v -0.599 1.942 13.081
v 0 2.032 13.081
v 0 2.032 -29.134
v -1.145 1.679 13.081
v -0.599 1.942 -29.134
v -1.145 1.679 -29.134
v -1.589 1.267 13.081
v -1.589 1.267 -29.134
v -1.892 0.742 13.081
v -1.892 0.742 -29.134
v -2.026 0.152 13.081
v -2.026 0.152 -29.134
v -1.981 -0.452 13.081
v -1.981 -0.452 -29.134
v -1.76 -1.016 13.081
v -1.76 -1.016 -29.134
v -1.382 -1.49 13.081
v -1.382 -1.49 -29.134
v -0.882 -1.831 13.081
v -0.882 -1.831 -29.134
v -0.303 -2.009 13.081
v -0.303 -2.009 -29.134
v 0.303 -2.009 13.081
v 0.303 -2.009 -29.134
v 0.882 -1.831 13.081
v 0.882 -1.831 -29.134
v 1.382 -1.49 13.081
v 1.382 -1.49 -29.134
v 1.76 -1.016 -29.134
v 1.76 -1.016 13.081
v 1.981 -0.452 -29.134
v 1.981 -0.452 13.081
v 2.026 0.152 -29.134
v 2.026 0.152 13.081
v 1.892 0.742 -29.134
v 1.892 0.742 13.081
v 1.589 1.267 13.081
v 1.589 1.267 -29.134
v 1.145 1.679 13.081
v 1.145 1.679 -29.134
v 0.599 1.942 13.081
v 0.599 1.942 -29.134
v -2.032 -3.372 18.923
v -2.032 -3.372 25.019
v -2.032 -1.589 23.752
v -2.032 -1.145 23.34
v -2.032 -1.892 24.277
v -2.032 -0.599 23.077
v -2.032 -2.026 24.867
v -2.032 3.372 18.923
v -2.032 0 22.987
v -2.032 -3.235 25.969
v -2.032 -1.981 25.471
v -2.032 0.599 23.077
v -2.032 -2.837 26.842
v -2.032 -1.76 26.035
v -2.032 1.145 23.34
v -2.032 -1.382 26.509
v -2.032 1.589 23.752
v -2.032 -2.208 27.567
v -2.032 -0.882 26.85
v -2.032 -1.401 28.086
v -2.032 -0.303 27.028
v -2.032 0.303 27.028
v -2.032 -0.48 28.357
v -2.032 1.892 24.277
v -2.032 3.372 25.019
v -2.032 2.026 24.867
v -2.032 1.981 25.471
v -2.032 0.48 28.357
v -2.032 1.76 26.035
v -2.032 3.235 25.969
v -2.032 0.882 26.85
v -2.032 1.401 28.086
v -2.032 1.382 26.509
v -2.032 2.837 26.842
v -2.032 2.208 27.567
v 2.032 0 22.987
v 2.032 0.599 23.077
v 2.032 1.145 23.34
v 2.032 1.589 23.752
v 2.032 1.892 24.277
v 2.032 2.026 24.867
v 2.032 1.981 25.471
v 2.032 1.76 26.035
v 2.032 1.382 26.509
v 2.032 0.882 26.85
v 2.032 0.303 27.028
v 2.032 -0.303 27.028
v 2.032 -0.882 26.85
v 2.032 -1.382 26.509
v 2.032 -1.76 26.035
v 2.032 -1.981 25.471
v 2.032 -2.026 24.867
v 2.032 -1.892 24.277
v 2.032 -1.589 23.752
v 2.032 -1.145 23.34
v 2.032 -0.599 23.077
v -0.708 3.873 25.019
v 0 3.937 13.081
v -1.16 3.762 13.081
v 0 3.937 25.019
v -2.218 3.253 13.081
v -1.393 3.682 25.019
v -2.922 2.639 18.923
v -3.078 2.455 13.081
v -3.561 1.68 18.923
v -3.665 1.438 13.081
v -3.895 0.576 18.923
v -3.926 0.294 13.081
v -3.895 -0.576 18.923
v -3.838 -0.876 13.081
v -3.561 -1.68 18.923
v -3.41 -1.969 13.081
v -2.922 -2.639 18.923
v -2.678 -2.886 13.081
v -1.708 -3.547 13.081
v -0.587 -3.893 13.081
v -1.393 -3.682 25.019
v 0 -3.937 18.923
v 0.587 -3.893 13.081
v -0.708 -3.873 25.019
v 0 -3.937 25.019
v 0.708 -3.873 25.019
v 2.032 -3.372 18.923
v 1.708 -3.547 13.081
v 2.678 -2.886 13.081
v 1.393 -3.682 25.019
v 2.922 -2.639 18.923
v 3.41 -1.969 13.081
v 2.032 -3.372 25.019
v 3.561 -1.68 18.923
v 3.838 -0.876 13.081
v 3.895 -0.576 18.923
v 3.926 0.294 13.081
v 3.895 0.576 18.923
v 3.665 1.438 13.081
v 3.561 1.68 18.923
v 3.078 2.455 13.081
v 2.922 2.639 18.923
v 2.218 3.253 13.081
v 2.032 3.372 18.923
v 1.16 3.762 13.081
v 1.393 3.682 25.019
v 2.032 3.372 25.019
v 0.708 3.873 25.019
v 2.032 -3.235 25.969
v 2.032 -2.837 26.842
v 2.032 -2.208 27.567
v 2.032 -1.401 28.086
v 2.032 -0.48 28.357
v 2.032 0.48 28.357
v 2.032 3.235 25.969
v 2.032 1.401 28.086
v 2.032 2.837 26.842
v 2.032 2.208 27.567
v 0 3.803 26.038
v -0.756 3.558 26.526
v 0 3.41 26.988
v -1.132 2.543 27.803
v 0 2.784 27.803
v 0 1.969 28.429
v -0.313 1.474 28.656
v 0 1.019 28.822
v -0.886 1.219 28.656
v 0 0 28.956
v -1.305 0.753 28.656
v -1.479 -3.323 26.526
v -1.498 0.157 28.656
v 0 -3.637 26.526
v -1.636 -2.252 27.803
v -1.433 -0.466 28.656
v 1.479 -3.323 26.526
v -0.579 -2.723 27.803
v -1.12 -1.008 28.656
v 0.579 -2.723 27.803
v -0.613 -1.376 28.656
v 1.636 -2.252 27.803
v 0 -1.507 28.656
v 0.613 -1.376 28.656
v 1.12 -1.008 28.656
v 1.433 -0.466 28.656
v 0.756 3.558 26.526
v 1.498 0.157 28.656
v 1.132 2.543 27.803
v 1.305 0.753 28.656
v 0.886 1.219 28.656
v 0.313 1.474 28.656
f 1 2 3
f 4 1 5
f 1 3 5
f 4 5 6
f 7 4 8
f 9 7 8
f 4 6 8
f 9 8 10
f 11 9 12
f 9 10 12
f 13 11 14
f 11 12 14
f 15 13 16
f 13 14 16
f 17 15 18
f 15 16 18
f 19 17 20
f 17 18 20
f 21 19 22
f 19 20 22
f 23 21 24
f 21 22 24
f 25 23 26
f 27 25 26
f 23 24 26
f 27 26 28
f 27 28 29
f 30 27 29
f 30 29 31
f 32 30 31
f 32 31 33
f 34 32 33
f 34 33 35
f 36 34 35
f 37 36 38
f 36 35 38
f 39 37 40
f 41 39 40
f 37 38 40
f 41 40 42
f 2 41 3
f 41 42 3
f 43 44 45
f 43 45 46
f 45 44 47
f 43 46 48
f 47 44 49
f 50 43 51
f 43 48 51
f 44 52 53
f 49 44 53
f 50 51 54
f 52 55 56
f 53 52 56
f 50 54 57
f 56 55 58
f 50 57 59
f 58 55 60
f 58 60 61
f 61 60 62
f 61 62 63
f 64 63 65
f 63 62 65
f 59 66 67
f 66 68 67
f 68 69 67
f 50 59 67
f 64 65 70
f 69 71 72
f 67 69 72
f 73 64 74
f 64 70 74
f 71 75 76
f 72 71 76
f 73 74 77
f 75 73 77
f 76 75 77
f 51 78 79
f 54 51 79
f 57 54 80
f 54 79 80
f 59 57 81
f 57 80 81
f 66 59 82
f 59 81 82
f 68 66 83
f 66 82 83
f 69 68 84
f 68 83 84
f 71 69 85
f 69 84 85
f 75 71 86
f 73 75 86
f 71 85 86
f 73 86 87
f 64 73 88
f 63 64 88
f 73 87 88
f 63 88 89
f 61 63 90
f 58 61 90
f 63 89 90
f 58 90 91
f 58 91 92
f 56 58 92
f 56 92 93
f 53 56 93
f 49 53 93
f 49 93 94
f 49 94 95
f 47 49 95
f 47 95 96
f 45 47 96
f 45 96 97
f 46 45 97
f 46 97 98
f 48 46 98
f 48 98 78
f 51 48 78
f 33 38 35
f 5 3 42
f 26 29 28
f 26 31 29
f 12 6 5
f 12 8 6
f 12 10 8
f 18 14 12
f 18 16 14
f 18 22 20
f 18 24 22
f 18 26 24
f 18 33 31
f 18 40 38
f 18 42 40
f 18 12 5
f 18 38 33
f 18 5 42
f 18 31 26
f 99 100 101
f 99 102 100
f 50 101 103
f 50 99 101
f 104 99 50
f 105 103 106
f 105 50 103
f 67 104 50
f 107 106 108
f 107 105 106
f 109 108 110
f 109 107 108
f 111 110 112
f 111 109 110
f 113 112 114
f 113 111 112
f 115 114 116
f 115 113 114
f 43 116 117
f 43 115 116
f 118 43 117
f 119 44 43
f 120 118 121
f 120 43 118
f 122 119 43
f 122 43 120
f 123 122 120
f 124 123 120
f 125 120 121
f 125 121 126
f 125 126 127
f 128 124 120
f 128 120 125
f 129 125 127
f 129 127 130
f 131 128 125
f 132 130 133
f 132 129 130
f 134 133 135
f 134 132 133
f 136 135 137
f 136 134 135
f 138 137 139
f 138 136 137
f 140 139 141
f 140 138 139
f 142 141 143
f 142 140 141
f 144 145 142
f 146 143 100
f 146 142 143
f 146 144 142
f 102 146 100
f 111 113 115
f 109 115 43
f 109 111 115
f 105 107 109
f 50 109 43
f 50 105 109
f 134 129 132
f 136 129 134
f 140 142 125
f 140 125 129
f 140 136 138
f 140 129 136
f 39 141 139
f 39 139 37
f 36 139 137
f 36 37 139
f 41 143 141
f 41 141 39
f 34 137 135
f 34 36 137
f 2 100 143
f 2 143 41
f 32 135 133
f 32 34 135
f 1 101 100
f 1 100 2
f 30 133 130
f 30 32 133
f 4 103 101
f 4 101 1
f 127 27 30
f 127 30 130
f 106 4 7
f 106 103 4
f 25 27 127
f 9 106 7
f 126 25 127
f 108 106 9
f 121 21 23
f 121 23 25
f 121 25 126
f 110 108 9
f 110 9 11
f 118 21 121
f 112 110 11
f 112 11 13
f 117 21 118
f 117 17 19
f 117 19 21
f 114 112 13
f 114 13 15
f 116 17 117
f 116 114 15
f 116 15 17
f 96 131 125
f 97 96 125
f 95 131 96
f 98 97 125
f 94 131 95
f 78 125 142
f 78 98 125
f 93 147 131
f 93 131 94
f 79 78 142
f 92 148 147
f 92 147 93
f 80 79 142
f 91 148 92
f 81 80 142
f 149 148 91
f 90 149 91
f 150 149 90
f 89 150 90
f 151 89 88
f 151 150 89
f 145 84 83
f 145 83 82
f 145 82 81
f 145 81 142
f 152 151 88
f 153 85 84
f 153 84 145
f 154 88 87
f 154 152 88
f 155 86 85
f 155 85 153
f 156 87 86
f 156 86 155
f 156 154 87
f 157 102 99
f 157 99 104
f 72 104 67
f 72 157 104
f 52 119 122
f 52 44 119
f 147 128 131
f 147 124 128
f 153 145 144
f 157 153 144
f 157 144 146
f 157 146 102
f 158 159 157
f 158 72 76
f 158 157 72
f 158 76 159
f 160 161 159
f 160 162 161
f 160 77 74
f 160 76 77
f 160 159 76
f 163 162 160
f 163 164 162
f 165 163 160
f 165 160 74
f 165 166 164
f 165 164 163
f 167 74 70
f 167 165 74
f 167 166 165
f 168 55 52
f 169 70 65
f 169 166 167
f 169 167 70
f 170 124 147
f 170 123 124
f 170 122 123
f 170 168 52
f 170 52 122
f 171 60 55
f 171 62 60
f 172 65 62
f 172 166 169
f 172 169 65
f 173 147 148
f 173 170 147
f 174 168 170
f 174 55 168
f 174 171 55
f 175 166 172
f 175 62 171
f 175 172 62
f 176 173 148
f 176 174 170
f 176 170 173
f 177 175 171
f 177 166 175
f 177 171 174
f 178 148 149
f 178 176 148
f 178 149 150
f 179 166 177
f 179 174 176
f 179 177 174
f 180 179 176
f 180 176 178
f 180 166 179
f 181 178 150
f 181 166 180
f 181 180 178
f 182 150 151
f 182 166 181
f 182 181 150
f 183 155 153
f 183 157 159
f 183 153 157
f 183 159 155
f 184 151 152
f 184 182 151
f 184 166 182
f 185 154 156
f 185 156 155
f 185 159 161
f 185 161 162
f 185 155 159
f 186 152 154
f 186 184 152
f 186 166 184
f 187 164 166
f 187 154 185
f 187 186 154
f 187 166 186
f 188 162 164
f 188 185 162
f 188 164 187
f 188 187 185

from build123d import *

# Parameters (mm, degrees)
FILLET2_R               = 0.77724
SKETCH2_R               = 2.032
EXTRUDE2_DEPTH          = 2.032
SKETCH9_W               = 42.2148
SKETCH9_H               = 2.032
SKETCH12_R              = 2.032
CUT_EXTRUDE1_DEPTH      = 6.9690001
CUT_EXTRUDE1_DEPTH_BACK = 6.9690001
SKETCH13_OUTSIDE_W      = 37.724
SKETCH13_OUTSIDE_H      = 37.724
SKETCH13_OUTSIDE_W_2    = 4.064
SKETCH13_OUTSIDE_H_2    = 7.874
CUT_EXTRUDE2_DEPTH      = 4.937
CUT_EXTRUDE2_DEPTH_BACK = 6.096
LPATTERN1_COUNT         = 2
LPATTERN1_PITCH         = 29.972


with BuildPart() as part:
    # Sketch1 → Revolve1 (revolve)
    with BuildSketch(Plane(origin=(0, 0, 0), x_dir=(0, 0, -1), z_dir=(1, 0, 0))):
        Polygon((46.609, 0), (46.609, 5.969), (-13.0302, 5.969), (-13.0302, 2.0828), (16.9926, 2.0828), (29.1846, 2.0828), (29.1846, 0), align=None)
    revolve(axis=Axis((0, 0, 54.991), (0, 0, -1)))

    # Fillet2
    fillet2_edges = [part.edges().sort_by_distance(p)[0] for p in [
        (0, -5.969, 13.0302),
        (0, -5.969, -46.609),
    ]]
    fillet(fillet2_edges, radius=FILLET2_R)

    # Sketch2 → Extrude2 (add, symmetric)
    with BuildSketch(Plane(origin=(0, 0, 0), x_dir=(0, 0, -1), z_dir=(1, 0, 0))):
        with BuildLine():
            Line((46.609, 3.81), (54.991, 3.81))
            ThreePointArc((54.991, 3.81), (58.801, 0), (54.991, -3.81))
            Line((54.991, -3.81), (46.609, -3.81))
            Line((46.609, -3.81), (46.609, 3.81))
        make_face()
        with Locations((54.991, 0)):
            Circle(SKETCH2_R, mode=Mode.SUBTRACT)
    extrude(amount=EXTRUDE2_DEPTH, both=True)


with BuildPart() as body_2:
    # Sketch9 → Revolve5 (revolve)
    with BuildSketch(Plane(origin=(0, 0, 0), x_dir=(0, 0, -1), z_dir=(1, 0, 0))):
        with Locations((-21.9456, 1.016)):
            Rectangle(SKETCH9_W, SKETCH9_H)
    revolve(axis=Axis((0, 0, 43.053), (0, 0, 1)))

    # Sketch11 → Revolve6 (revolve)
    with BuildSketch(Plane(origin=(0, 0, 0), x_dir=(0, 0, -1), z_dir=(1, 0, 0))):
        with BuildLine():
            Line((-43.053, 0), (-43.053, 3.937))
            Line((-43.053, 3.937), (-54.991, 3.937))
            ThreePointArc((-54.991, 3.937), (-57.774879398, 2.783879398), (-58.928, 0))
            Line((-58.928, 0), (-43.053, 0))
        make_face()
    revolve(axis=Axis((0, 0, 58.928), (0, 0, 1)))

    # Sketch12 → Cut-Extrude1 (cut, two sides)
    with BuildSketch(Plane(origin=(0, 0, 0), x_dir=(0, 0, -1), z_dir=(1, 0, 0))) as cut_extrude1_sk:
        with Locations((-54.991, 0)):
            Circle(SKETCH12_R)
    extrude(amount=CUT_EXTRUDE1_DEPTH, mode=Mode.SUBTRACT)
    extrude(cut_extrude1_sk.sketch, amount=-CUT_EXTRUDE1_DEPTH_BACK, mode=Mode.SUBTRACT)

    # Sketch13 outside → Cut-Extrude2 (cut, two sides)
    with BuildSketch(Plane.XY.offset(54.991)) as cut_extrude2_sk:
        Rectangle(SKETCH13_OUTSIDE_W, SKETCH13_OUTSIDE_H)
        Rectangle(SKETCH13_OUTSIDE_W_2, SKETCH13_OUTSIDE_H_2, mode=Mode.SUBTRACT)
    extrude(amount=CUT_EXTRUDE2_DEPTH, mode=Mode.SUBTRACT)
    extrude(cut_extrude2_sk.sketch, amount=-CUT_EXTRUDE2_DEPTH_BACK, mode=Mode.SUBTRACT)


with BuildPart() as lpattern1_1:
    # LPattern1: pattern copy
    add(body_2.part.moved(Location(Vector(0, 0, -1) * (1 * LPATTERN1_PITCH))))


solid = lpattern1_1.part
